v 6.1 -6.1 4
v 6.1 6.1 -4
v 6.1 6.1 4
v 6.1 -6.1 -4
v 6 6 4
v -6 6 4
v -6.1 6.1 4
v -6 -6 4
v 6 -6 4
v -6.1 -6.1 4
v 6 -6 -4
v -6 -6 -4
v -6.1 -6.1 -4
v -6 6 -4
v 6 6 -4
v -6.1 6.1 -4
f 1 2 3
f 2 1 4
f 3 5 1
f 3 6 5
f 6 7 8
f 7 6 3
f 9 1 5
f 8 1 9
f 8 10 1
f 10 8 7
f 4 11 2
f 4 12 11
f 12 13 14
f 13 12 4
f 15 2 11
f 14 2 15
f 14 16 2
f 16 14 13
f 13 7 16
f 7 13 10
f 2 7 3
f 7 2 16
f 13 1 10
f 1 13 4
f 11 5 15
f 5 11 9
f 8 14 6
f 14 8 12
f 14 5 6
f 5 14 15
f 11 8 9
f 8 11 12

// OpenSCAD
module Pipeline (length) {
    difference () {
        cube(size=[12.2, 12.2, length], center=true);
        cube(size=[12, 12, length], center=true);
    }
}

module main() {
    Pipeline (8)
        sphere(1,center = true);
}

main ();
